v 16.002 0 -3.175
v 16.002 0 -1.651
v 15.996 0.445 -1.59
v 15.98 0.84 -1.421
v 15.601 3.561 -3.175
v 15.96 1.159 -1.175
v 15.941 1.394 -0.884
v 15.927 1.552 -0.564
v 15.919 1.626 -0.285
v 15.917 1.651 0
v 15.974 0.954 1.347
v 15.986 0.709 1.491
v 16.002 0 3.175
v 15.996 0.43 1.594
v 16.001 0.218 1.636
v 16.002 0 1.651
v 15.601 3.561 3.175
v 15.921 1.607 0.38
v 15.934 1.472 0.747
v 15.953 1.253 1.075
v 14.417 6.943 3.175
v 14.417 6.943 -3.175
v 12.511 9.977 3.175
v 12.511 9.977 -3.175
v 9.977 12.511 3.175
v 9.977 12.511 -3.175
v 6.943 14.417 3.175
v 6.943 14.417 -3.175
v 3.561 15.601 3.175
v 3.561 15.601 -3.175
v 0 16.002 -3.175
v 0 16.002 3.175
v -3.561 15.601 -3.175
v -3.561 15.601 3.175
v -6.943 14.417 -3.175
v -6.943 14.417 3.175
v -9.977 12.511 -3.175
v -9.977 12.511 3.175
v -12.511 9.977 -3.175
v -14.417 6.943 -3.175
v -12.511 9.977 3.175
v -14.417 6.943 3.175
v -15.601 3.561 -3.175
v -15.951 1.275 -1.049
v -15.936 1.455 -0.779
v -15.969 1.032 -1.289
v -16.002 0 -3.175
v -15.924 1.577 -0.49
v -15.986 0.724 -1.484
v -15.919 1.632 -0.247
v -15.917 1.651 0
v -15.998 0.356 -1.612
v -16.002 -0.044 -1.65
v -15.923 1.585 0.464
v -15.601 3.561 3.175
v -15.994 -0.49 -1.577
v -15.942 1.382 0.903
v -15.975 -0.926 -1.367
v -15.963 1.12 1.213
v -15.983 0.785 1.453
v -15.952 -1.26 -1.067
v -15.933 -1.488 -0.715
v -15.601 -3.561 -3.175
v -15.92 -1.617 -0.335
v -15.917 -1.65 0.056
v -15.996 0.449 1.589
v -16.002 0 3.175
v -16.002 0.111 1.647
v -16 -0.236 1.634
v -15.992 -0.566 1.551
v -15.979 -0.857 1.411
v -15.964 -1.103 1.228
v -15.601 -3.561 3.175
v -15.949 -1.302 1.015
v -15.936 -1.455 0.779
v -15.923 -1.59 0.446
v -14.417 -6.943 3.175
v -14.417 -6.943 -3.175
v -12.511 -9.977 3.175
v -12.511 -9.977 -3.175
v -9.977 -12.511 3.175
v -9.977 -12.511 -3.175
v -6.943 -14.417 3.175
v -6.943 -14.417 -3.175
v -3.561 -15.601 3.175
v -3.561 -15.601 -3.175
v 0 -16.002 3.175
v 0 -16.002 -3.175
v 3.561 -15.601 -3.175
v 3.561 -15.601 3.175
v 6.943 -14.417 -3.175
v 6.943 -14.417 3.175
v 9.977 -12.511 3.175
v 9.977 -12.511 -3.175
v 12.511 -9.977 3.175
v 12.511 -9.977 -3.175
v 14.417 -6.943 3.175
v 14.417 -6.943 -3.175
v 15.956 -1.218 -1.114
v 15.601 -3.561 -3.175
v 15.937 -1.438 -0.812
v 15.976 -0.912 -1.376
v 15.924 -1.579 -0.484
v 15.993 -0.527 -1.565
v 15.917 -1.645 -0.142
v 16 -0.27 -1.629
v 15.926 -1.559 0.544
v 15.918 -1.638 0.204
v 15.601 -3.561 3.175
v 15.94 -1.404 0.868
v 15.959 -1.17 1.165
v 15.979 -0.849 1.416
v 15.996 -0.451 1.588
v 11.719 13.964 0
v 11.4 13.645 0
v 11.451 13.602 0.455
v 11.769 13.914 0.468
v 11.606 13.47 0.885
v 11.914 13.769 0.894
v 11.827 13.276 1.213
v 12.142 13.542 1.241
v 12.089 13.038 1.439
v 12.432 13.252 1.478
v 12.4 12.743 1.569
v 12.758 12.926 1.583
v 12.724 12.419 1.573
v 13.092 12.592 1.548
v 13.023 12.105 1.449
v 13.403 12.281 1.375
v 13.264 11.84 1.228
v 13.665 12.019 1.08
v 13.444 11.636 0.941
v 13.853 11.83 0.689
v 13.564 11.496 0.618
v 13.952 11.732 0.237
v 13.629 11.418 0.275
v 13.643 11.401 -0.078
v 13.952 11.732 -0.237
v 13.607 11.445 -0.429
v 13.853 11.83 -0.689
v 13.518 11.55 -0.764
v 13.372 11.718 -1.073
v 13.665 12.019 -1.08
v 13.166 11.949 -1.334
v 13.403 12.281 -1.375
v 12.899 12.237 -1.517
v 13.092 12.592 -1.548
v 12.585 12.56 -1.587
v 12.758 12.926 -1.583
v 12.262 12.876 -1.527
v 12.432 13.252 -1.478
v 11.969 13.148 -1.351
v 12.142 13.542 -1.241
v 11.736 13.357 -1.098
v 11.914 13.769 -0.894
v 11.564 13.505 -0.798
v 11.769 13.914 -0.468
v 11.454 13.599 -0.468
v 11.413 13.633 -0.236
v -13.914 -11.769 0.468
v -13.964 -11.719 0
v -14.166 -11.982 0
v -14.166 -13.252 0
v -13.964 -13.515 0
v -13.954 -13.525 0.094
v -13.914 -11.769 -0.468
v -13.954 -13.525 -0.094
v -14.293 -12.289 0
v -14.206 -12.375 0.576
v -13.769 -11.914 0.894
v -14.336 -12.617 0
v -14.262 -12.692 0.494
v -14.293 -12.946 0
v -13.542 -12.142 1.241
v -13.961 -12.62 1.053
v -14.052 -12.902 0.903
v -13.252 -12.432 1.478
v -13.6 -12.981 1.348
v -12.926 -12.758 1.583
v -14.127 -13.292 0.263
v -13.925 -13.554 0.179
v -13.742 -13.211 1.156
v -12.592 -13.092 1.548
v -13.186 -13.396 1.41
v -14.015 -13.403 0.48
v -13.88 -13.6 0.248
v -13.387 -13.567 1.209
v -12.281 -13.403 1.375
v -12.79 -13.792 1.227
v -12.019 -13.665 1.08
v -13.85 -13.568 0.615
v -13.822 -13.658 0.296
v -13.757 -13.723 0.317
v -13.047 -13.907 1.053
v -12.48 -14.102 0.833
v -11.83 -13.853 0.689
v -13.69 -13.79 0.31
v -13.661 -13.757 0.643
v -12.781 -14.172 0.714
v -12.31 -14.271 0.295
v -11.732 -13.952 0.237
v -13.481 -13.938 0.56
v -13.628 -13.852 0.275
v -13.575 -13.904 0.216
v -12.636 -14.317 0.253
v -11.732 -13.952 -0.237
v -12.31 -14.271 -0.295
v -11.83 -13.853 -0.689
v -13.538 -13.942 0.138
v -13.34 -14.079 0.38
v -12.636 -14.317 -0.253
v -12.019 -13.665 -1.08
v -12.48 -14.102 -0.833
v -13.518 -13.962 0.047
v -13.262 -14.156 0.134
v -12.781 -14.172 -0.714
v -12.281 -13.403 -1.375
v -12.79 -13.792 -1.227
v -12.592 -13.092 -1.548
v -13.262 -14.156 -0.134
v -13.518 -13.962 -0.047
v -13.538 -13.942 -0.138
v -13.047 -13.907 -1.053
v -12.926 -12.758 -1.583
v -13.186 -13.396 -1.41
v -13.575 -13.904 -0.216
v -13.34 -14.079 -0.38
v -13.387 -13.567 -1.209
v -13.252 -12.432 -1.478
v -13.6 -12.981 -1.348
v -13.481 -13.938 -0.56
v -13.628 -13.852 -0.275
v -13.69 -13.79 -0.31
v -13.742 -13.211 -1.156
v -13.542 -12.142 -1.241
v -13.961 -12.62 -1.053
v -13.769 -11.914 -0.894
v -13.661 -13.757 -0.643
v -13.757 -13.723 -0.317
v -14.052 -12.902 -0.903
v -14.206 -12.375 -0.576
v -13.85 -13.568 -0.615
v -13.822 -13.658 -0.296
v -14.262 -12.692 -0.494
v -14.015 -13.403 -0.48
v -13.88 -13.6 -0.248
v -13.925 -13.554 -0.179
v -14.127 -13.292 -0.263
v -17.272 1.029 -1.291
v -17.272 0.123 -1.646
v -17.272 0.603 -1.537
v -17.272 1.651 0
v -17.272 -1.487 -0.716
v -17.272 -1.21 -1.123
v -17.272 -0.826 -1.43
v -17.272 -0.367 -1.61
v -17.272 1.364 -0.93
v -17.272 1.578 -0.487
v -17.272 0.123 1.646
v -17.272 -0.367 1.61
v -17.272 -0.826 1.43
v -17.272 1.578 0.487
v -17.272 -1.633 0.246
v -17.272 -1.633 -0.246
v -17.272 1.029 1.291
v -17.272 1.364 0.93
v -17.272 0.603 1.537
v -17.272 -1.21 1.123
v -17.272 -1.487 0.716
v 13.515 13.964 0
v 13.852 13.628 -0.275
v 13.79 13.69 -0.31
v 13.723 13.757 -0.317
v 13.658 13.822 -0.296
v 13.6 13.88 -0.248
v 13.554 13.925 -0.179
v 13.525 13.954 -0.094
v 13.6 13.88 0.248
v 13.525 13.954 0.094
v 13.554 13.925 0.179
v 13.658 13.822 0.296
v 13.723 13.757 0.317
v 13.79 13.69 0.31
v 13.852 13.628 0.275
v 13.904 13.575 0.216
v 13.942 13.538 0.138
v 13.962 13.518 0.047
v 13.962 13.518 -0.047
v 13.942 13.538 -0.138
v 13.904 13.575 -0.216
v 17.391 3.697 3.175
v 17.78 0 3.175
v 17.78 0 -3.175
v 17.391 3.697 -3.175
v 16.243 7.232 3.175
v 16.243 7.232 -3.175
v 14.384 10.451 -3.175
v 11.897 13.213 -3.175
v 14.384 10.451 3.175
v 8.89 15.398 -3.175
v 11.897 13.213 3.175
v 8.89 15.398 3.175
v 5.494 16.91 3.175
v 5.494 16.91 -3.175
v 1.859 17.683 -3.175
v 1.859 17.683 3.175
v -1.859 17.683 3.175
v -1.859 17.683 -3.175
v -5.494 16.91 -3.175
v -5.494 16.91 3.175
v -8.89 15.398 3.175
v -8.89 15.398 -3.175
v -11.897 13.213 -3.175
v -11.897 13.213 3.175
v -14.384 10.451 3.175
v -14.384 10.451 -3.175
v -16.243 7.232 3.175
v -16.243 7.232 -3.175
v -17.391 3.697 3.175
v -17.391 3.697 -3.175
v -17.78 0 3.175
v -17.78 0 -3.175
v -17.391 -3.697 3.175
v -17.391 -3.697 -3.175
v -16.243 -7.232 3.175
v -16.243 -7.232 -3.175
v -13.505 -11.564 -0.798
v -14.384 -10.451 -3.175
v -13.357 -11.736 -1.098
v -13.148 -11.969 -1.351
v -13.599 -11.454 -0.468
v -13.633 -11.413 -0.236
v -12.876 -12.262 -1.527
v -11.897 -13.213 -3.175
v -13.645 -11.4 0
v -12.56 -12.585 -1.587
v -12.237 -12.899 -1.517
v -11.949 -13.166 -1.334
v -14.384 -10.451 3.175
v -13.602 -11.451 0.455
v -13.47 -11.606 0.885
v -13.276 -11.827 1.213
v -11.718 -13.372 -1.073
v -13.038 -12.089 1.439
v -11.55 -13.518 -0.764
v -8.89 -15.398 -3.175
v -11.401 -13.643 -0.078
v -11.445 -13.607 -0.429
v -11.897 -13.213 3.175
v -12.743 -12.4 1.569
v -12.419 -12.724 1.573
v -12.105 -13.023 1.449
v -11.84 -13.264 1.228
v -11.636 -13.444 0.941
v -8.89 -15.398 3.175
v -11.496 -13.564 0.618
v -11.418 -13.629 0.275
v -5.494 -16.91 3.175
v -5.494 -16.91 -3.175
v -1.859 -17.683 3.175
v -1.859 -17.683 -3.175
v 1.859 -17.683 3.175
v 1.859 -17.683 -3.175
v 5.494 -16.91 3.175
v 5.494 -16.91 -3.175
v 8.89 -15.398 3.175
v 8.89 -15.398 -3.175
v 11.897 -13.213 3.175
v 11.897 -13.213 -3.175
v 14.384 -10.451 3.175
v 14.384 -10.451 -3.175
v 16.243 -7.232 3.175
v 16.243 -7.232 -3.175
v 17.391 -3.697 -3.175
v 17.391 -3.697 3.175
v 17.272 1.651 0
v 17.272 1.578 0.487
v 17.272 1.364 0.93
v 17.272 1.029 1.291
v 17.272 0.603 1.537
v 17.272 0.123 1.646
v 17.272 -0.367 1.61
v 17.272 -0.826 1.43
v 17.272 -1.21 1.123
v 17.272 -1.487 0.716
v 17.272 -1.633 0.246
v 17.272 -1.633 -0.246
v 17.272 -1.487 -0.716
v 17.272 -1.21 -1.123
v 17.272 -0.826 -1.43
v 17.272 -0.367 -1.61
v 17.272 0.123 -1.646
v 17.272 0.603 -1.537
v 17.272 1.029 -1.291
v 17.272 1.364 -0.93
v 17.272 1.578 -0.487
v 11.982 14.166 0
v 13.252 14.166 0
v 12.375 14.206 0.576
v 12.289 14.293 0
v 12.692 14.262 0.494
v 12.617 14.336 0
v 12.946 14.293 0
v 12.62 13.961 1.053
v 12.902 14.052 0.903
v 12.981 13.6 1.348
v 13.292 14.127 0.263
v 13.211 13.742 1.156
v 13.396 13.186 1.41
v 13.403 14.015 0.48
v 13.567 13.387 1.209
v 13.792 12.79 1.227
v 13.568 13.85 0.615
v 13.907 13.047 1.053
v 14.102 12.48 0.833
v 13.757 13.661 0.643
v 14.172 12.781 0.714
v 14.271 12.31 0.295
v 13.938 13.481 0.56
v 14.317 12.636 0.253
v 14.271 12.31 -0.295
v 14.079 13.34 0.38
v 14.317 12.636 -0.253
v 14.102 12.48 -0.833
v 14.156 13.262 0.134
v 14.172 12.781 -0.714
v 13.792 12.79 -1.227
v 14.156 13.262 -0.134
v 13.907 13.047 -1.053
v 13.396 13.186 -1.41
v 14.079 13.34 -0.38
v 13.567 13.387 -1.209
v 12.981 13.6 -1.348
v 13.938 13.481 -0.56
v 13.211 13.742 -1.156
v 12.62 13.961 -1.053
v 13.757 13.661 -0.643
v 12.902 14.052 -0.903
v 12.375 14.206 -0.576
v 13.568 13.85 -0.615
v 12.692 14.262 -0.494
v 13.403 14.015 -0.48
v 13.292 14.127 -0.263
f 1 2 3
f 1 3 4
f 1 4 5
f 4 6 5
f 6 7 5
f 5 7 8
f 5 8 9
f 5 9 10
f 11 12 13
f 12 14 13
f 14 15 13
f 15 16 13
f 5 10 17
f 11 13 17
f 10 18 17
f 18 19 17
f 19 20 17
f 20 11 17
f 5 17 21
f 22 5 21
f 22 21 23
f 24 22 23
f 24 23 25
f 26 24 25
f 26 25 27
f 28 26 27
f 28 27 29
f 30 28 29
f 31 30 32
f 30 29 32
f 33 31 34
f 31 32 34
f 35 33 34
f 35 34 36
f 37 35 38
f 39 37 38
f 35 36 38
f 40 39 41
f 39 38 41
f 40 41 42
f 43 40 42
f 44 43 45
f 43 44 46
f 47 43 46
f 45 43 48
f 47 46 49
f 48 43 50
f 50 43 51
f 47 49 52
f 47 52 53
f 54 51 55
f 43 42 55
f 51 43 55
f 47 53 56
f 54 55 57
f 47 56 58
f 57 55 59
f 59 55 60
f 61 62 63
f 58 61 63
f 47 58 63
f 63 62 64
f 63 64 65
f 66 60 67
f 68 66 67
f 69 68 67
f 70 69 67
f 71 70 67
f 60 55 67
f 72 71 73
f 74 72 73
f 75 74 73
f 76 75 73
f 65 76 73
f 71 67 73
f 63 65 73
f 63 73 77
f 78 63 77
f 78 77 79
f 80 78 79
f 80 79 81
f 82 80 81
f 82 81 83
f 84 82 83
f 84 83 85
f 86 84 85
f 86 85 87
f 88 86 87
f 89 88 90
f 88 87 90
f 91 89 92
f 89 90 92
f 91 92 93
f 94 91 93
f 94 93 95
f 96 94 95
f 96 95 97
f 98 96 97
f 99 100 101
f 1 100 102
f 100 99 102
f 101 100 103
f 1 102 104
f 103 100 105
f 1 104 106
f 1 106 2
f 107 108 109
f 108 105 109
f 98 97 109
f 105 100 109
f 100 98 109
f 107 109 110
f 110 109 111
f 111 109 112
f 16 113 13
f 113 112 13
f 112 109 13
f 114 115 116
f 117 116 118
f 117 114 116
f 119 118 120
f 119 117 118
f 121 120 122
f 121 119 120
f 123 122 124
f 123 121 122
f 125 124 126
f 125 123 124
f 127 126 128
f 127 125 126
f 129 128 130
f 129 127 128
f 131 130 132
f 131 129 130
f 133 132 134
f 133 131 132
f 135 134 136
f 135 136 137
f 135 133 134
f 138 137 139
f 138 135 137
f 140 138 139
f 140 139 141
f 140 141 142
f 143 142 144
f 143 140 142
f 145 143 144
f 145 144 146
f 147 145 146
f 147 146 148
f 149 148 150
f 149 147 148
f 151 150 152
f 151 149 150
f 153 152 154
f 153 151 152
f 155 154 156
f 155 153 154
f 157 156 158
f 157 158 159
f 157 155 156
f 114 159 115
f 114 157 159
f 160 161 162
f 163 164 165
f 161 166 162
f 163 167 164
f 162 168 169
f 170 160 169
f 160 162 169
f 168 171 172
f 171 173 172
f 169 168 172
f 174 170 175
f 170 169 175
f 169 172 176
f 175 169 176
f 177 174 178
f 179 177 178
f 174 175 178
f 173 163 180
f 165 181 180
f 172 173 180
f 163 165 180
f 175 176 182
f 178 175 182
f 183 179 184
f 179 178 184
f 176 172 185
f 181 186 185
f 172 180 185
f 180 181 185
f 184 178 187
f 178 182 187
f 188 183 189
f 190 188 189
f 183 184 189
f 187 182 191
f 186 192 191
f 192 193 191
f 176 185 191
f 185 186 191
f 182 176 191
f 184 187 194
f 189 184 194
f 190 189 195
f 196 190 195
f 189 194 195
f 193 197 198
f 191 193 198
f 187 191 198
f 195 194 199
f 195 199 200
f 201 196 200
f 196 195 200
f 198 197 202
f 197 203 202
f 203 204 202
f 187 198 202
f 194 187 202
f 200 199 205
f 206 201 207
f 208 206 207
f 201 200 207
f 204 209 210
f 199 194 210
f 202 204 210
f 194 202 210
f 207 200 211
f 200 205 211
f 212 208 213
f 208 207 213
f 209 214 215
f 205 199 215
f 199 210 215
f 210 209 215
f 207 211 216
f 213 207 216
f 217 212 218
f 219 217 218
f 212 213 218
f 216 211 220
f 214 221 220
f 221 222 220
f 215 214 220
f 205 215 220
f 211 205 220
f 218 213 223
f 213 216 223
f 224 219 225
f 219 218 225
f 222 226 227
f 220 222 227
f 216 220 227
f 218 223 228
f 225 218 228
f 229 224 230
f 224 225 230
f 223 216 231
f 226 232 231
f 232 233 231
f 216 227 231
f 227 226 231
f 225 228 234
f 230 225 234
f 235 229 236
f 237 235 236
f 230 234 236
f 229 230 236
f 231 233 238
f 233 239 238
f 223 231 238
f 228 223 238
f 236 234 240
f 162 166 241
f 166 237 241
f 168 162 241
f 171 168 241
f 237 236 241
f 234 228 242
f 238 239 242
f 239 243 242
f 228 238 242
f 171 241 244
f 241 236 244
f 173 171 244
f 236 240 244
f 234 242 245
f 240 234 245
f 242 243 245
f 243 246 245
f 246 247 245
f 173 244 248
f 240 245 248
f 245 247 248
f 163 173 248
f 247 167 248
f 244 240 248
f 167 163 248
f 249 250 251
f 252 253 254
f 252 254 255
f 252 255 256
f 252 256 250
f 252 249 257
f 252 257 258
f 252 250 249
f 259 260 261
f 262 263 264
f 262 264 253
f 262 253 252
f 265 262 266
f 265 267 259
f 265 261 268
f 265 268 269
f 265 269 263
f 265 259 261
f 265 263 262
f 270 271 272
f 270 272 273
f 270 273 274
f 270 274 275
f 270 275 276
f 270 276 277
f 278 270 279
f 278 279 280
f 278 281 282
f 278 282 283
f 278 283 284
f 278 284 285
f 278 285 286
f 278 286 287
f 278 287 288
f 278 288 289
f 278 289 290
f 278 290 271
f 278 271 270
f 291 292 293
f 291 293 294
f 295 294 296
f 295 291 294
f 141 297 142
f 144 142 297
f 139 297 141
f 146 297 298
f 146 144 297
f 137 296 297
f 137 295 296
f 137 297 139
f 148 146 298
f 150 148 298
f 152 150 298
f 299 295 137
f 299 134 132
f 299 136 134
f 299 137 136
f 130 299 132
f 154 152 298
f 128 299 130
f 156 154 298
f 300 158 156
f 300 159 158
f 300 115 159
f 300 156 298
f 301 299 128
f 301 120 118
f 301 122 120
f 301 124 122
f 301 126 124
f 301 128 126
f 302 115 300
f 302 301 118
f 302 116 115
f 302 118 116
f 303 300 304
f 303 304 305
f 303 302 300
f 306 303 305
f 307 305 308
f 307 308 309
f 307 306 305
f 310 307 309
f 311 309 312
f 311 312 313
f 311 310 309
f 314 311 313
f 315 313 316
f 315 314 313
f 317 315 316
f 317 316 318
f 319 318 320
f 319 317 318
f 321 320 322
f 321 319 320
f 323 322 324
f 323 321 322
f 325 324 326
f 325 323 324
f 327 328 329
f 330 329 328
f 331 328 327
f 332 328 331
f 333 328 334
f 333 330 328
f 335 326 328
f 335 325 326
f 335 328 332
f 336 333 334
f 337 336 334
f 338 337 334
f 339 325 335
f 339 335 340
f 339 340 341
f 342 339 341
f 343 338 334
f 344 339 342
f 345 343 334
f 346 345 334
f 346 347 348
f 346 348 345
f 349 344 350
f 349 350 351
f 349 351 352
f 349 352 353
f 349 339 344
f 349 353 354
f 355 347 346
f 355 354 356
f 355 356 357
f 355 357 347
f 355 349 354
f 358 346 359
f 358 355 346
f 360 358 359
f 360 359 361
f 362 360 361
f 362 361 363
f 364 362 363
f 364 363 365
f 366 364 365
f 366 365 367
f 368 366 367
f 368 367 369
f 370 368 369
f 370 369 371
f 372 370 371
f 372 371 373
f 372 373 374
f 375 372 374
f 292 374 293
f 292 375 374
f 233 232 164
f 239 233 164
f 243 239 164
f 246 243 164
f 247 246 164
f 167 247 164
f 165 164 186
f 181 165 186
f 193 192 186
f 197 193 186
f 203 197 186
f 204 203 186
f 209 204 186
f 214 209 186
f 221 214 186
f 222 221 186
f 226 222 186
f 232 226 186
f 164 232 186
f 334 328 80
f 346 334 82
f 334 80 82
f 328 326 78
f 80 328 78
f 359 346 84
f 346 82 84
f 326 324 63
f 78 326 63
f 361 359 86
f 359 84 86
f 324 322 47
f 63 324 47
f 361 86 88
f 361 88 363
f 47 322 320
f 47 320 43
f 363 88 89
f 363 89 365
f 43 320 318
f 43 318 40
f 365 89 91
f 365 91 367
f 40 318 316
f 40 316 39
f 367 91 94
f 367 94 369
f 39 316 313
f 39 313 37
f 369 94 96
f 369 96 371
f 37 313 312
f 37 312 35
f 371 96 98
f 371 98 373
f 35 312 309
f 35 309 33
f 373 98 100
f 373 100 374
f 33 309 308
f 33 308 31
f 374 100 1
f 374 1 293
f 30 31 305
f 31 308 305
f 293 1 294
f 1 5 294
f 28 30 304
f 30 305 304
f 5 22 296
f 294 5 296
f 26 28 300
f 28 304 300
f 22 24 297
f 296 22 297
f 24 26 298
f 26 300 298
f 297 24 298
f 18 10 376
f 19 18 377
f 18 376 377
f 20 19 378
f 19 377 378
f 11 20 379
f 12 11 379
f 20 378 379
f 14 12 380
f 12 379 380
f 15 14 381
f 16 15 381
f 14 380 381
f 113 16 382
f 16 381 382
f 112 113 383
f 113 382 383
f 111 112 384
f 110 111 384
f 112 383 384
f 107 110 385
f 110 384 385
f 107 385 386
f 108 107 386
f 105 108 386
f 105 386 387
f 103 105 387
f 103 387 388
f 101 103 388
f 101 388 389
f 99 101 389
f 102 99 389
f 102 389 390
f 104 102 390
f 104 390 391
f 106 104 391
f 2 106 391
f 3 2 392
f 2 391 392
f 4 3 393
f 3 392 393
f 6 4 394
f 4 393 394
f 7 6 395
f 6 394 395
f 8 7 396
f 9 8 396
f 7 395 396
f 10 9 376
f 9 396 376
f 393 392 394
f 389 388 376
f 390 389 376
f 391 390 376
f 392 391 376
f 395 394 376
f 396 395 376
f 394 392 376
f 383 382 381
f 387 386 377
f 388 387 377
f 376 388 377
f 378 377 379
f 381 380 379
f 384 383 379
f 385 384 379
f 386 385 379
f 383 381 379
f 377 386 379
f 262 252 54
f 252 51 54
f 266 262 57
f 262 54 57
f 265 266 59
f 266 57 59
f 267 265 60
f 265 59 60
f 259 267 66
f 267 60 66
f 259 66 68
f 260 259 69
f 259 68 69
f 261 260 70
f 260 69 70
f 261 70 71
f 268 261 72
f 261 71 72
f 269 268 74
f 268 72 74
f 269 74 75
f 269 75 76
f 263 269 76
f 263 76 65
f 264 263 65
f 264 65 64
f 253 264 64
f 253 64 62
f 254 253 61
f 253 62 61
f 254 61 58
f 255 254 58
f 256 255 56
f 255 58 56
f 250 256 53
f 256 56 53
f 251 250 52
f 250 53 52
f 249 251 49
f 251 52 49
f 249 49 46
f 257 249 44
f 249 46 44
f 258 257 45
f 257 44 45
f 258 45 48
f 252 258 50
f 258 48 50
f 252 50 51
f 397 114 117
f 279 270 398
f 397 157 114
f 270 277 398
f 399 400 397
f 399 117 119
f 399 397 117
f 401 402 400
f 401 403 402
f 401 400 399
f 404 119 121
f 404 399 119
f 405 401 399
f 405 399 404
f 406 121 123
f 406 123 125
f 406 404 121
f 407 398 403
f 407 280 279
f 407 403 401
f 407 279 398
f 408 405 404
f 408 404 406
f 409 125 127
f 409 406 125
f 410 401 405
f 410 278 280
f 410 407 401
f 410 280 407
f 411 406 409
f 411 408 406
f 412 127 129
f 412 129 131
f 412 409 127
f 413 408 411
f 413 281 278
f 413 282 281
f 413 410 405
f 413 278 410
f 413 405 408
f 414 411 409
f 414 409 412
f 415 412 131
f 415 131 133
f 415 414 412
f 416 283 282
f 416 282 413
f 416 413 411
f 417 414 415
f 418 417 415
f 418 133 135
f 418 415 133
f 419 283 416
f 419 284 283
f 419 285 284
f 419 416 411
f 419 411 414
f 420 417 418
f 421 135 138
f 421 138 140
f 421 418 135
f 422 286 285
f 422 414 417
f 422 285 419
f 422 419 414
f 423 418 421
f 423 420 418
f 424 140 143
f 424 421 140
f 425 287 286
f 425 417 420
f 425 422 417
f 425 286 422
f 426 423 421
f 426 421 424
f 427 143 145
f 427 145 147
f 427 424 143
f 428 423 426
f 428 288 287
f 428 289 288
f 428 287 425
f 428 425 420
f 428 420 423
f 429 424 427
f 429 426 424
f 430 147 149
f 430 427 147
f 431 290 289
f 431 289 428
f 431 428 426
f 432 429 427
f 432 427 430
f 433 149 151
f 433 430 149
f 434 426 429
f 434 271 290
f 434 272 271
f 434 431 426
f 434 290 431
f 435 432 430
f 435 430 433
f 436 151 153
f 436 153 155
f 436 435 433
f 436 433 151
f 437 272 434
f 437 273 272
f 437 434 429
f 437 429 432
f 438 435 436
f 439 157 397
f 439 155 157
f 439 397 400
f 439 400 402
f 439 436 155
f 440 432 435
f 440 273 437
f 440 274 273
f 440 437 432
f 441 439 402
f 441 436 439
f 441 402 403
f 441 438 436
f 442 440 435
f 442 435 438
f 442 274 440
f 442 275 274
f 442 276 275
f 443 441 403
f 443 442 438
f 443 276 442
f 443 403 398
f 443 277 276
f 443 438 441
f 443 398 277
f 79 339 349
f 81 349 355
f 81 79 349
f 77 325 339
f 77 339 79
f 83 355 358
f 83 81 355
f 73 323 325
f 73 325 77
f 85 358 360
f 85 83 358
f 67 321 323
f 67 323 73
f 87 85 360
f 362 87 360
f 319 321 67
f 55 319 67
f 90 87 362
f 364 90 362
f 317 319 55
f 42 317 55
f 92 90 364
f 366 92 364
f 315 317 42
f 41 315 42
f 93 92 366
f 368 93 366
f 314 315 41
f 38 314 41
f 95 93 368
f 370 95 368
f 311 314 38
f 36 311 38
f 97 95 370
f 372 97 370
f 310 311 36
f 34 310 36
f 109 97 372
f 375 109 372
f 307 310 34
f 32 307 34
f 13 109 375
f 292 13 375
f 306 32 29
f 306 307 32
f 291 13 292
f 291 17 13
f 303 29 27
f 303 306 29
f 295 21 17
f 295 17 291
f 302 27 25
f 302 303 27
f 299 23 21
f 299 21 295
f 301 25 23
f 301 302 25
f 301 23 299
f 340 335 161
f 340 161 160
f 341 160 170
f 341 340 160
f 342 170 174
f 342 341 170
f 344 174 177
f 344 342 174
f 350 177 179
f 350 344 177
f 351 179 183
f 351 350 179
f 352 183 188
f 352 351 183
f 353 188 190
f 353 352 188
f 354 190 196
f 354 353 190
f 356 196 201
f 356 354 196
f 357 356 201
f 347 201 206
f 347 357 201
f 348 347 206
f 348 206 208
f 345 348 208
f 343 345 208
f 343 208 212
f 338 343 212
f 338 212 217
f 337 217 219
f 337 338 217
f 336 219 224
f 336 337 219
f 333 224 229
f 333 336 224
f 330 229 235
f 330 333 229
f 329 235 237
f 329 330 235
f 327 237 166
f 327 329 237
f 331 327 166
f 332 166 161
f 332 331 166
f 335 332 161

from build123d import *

# Parameters (mm, degrees)
F1_R     = 17.78
F2_DEPTH = 3.175
F3_R     = 1.651
F4_DEPTH = 17.272
F5_R     = 1.5875
F6_DEPTH = 19.431
F7_R     = 16.002
F8_DEPTH = 6.3510001
F9_R     = 1.27


with BuildPart() as f2:
    # F1 (on Top) → F2 (new body, symmetric)
    with BuildSketch(Plane.XY):
        Circle(F1_R)
    extrude(amount=F2_DEPTH, both=True)

    # F3 (on Right) → F4 (cut, symmetric)
    with BuildSketch(Plane.YZ):
        Circle(F3_R)
    extrude(amount=F4_DEPTH, both=True, mode=Mode.SUBTRACT)

    # F5 (on face) → F6 (join, symmetric)
    with BuildSketch(Plane(origin=(0, 0, 0), x_dir=(-0.7071067812, 0.7071067812, 0), z_dir=(0.7071067812, 0.7071067812, 0))):
        Circle(F5_R)
    extrude(amount=F6_DEPTH, both=True)

    # F7 (on face) → F8 (cut, through all)
    with BuildSketch(Plane.XY.offset(3.175)):
        Circle(F7_R)
    extrude(amount=-F8_DEPTH, mode=Mode.SUBTRACT)

    # F9
    f9_edges = [f2.edges().sort_by_distance(p)[0] for p in [
        (14.862324, 12.61726, 0),
        (-12.61726, -14.862324, 0),
    ]]
    fillet(f9_edges, radius=F9_R)


solid = f2.part
